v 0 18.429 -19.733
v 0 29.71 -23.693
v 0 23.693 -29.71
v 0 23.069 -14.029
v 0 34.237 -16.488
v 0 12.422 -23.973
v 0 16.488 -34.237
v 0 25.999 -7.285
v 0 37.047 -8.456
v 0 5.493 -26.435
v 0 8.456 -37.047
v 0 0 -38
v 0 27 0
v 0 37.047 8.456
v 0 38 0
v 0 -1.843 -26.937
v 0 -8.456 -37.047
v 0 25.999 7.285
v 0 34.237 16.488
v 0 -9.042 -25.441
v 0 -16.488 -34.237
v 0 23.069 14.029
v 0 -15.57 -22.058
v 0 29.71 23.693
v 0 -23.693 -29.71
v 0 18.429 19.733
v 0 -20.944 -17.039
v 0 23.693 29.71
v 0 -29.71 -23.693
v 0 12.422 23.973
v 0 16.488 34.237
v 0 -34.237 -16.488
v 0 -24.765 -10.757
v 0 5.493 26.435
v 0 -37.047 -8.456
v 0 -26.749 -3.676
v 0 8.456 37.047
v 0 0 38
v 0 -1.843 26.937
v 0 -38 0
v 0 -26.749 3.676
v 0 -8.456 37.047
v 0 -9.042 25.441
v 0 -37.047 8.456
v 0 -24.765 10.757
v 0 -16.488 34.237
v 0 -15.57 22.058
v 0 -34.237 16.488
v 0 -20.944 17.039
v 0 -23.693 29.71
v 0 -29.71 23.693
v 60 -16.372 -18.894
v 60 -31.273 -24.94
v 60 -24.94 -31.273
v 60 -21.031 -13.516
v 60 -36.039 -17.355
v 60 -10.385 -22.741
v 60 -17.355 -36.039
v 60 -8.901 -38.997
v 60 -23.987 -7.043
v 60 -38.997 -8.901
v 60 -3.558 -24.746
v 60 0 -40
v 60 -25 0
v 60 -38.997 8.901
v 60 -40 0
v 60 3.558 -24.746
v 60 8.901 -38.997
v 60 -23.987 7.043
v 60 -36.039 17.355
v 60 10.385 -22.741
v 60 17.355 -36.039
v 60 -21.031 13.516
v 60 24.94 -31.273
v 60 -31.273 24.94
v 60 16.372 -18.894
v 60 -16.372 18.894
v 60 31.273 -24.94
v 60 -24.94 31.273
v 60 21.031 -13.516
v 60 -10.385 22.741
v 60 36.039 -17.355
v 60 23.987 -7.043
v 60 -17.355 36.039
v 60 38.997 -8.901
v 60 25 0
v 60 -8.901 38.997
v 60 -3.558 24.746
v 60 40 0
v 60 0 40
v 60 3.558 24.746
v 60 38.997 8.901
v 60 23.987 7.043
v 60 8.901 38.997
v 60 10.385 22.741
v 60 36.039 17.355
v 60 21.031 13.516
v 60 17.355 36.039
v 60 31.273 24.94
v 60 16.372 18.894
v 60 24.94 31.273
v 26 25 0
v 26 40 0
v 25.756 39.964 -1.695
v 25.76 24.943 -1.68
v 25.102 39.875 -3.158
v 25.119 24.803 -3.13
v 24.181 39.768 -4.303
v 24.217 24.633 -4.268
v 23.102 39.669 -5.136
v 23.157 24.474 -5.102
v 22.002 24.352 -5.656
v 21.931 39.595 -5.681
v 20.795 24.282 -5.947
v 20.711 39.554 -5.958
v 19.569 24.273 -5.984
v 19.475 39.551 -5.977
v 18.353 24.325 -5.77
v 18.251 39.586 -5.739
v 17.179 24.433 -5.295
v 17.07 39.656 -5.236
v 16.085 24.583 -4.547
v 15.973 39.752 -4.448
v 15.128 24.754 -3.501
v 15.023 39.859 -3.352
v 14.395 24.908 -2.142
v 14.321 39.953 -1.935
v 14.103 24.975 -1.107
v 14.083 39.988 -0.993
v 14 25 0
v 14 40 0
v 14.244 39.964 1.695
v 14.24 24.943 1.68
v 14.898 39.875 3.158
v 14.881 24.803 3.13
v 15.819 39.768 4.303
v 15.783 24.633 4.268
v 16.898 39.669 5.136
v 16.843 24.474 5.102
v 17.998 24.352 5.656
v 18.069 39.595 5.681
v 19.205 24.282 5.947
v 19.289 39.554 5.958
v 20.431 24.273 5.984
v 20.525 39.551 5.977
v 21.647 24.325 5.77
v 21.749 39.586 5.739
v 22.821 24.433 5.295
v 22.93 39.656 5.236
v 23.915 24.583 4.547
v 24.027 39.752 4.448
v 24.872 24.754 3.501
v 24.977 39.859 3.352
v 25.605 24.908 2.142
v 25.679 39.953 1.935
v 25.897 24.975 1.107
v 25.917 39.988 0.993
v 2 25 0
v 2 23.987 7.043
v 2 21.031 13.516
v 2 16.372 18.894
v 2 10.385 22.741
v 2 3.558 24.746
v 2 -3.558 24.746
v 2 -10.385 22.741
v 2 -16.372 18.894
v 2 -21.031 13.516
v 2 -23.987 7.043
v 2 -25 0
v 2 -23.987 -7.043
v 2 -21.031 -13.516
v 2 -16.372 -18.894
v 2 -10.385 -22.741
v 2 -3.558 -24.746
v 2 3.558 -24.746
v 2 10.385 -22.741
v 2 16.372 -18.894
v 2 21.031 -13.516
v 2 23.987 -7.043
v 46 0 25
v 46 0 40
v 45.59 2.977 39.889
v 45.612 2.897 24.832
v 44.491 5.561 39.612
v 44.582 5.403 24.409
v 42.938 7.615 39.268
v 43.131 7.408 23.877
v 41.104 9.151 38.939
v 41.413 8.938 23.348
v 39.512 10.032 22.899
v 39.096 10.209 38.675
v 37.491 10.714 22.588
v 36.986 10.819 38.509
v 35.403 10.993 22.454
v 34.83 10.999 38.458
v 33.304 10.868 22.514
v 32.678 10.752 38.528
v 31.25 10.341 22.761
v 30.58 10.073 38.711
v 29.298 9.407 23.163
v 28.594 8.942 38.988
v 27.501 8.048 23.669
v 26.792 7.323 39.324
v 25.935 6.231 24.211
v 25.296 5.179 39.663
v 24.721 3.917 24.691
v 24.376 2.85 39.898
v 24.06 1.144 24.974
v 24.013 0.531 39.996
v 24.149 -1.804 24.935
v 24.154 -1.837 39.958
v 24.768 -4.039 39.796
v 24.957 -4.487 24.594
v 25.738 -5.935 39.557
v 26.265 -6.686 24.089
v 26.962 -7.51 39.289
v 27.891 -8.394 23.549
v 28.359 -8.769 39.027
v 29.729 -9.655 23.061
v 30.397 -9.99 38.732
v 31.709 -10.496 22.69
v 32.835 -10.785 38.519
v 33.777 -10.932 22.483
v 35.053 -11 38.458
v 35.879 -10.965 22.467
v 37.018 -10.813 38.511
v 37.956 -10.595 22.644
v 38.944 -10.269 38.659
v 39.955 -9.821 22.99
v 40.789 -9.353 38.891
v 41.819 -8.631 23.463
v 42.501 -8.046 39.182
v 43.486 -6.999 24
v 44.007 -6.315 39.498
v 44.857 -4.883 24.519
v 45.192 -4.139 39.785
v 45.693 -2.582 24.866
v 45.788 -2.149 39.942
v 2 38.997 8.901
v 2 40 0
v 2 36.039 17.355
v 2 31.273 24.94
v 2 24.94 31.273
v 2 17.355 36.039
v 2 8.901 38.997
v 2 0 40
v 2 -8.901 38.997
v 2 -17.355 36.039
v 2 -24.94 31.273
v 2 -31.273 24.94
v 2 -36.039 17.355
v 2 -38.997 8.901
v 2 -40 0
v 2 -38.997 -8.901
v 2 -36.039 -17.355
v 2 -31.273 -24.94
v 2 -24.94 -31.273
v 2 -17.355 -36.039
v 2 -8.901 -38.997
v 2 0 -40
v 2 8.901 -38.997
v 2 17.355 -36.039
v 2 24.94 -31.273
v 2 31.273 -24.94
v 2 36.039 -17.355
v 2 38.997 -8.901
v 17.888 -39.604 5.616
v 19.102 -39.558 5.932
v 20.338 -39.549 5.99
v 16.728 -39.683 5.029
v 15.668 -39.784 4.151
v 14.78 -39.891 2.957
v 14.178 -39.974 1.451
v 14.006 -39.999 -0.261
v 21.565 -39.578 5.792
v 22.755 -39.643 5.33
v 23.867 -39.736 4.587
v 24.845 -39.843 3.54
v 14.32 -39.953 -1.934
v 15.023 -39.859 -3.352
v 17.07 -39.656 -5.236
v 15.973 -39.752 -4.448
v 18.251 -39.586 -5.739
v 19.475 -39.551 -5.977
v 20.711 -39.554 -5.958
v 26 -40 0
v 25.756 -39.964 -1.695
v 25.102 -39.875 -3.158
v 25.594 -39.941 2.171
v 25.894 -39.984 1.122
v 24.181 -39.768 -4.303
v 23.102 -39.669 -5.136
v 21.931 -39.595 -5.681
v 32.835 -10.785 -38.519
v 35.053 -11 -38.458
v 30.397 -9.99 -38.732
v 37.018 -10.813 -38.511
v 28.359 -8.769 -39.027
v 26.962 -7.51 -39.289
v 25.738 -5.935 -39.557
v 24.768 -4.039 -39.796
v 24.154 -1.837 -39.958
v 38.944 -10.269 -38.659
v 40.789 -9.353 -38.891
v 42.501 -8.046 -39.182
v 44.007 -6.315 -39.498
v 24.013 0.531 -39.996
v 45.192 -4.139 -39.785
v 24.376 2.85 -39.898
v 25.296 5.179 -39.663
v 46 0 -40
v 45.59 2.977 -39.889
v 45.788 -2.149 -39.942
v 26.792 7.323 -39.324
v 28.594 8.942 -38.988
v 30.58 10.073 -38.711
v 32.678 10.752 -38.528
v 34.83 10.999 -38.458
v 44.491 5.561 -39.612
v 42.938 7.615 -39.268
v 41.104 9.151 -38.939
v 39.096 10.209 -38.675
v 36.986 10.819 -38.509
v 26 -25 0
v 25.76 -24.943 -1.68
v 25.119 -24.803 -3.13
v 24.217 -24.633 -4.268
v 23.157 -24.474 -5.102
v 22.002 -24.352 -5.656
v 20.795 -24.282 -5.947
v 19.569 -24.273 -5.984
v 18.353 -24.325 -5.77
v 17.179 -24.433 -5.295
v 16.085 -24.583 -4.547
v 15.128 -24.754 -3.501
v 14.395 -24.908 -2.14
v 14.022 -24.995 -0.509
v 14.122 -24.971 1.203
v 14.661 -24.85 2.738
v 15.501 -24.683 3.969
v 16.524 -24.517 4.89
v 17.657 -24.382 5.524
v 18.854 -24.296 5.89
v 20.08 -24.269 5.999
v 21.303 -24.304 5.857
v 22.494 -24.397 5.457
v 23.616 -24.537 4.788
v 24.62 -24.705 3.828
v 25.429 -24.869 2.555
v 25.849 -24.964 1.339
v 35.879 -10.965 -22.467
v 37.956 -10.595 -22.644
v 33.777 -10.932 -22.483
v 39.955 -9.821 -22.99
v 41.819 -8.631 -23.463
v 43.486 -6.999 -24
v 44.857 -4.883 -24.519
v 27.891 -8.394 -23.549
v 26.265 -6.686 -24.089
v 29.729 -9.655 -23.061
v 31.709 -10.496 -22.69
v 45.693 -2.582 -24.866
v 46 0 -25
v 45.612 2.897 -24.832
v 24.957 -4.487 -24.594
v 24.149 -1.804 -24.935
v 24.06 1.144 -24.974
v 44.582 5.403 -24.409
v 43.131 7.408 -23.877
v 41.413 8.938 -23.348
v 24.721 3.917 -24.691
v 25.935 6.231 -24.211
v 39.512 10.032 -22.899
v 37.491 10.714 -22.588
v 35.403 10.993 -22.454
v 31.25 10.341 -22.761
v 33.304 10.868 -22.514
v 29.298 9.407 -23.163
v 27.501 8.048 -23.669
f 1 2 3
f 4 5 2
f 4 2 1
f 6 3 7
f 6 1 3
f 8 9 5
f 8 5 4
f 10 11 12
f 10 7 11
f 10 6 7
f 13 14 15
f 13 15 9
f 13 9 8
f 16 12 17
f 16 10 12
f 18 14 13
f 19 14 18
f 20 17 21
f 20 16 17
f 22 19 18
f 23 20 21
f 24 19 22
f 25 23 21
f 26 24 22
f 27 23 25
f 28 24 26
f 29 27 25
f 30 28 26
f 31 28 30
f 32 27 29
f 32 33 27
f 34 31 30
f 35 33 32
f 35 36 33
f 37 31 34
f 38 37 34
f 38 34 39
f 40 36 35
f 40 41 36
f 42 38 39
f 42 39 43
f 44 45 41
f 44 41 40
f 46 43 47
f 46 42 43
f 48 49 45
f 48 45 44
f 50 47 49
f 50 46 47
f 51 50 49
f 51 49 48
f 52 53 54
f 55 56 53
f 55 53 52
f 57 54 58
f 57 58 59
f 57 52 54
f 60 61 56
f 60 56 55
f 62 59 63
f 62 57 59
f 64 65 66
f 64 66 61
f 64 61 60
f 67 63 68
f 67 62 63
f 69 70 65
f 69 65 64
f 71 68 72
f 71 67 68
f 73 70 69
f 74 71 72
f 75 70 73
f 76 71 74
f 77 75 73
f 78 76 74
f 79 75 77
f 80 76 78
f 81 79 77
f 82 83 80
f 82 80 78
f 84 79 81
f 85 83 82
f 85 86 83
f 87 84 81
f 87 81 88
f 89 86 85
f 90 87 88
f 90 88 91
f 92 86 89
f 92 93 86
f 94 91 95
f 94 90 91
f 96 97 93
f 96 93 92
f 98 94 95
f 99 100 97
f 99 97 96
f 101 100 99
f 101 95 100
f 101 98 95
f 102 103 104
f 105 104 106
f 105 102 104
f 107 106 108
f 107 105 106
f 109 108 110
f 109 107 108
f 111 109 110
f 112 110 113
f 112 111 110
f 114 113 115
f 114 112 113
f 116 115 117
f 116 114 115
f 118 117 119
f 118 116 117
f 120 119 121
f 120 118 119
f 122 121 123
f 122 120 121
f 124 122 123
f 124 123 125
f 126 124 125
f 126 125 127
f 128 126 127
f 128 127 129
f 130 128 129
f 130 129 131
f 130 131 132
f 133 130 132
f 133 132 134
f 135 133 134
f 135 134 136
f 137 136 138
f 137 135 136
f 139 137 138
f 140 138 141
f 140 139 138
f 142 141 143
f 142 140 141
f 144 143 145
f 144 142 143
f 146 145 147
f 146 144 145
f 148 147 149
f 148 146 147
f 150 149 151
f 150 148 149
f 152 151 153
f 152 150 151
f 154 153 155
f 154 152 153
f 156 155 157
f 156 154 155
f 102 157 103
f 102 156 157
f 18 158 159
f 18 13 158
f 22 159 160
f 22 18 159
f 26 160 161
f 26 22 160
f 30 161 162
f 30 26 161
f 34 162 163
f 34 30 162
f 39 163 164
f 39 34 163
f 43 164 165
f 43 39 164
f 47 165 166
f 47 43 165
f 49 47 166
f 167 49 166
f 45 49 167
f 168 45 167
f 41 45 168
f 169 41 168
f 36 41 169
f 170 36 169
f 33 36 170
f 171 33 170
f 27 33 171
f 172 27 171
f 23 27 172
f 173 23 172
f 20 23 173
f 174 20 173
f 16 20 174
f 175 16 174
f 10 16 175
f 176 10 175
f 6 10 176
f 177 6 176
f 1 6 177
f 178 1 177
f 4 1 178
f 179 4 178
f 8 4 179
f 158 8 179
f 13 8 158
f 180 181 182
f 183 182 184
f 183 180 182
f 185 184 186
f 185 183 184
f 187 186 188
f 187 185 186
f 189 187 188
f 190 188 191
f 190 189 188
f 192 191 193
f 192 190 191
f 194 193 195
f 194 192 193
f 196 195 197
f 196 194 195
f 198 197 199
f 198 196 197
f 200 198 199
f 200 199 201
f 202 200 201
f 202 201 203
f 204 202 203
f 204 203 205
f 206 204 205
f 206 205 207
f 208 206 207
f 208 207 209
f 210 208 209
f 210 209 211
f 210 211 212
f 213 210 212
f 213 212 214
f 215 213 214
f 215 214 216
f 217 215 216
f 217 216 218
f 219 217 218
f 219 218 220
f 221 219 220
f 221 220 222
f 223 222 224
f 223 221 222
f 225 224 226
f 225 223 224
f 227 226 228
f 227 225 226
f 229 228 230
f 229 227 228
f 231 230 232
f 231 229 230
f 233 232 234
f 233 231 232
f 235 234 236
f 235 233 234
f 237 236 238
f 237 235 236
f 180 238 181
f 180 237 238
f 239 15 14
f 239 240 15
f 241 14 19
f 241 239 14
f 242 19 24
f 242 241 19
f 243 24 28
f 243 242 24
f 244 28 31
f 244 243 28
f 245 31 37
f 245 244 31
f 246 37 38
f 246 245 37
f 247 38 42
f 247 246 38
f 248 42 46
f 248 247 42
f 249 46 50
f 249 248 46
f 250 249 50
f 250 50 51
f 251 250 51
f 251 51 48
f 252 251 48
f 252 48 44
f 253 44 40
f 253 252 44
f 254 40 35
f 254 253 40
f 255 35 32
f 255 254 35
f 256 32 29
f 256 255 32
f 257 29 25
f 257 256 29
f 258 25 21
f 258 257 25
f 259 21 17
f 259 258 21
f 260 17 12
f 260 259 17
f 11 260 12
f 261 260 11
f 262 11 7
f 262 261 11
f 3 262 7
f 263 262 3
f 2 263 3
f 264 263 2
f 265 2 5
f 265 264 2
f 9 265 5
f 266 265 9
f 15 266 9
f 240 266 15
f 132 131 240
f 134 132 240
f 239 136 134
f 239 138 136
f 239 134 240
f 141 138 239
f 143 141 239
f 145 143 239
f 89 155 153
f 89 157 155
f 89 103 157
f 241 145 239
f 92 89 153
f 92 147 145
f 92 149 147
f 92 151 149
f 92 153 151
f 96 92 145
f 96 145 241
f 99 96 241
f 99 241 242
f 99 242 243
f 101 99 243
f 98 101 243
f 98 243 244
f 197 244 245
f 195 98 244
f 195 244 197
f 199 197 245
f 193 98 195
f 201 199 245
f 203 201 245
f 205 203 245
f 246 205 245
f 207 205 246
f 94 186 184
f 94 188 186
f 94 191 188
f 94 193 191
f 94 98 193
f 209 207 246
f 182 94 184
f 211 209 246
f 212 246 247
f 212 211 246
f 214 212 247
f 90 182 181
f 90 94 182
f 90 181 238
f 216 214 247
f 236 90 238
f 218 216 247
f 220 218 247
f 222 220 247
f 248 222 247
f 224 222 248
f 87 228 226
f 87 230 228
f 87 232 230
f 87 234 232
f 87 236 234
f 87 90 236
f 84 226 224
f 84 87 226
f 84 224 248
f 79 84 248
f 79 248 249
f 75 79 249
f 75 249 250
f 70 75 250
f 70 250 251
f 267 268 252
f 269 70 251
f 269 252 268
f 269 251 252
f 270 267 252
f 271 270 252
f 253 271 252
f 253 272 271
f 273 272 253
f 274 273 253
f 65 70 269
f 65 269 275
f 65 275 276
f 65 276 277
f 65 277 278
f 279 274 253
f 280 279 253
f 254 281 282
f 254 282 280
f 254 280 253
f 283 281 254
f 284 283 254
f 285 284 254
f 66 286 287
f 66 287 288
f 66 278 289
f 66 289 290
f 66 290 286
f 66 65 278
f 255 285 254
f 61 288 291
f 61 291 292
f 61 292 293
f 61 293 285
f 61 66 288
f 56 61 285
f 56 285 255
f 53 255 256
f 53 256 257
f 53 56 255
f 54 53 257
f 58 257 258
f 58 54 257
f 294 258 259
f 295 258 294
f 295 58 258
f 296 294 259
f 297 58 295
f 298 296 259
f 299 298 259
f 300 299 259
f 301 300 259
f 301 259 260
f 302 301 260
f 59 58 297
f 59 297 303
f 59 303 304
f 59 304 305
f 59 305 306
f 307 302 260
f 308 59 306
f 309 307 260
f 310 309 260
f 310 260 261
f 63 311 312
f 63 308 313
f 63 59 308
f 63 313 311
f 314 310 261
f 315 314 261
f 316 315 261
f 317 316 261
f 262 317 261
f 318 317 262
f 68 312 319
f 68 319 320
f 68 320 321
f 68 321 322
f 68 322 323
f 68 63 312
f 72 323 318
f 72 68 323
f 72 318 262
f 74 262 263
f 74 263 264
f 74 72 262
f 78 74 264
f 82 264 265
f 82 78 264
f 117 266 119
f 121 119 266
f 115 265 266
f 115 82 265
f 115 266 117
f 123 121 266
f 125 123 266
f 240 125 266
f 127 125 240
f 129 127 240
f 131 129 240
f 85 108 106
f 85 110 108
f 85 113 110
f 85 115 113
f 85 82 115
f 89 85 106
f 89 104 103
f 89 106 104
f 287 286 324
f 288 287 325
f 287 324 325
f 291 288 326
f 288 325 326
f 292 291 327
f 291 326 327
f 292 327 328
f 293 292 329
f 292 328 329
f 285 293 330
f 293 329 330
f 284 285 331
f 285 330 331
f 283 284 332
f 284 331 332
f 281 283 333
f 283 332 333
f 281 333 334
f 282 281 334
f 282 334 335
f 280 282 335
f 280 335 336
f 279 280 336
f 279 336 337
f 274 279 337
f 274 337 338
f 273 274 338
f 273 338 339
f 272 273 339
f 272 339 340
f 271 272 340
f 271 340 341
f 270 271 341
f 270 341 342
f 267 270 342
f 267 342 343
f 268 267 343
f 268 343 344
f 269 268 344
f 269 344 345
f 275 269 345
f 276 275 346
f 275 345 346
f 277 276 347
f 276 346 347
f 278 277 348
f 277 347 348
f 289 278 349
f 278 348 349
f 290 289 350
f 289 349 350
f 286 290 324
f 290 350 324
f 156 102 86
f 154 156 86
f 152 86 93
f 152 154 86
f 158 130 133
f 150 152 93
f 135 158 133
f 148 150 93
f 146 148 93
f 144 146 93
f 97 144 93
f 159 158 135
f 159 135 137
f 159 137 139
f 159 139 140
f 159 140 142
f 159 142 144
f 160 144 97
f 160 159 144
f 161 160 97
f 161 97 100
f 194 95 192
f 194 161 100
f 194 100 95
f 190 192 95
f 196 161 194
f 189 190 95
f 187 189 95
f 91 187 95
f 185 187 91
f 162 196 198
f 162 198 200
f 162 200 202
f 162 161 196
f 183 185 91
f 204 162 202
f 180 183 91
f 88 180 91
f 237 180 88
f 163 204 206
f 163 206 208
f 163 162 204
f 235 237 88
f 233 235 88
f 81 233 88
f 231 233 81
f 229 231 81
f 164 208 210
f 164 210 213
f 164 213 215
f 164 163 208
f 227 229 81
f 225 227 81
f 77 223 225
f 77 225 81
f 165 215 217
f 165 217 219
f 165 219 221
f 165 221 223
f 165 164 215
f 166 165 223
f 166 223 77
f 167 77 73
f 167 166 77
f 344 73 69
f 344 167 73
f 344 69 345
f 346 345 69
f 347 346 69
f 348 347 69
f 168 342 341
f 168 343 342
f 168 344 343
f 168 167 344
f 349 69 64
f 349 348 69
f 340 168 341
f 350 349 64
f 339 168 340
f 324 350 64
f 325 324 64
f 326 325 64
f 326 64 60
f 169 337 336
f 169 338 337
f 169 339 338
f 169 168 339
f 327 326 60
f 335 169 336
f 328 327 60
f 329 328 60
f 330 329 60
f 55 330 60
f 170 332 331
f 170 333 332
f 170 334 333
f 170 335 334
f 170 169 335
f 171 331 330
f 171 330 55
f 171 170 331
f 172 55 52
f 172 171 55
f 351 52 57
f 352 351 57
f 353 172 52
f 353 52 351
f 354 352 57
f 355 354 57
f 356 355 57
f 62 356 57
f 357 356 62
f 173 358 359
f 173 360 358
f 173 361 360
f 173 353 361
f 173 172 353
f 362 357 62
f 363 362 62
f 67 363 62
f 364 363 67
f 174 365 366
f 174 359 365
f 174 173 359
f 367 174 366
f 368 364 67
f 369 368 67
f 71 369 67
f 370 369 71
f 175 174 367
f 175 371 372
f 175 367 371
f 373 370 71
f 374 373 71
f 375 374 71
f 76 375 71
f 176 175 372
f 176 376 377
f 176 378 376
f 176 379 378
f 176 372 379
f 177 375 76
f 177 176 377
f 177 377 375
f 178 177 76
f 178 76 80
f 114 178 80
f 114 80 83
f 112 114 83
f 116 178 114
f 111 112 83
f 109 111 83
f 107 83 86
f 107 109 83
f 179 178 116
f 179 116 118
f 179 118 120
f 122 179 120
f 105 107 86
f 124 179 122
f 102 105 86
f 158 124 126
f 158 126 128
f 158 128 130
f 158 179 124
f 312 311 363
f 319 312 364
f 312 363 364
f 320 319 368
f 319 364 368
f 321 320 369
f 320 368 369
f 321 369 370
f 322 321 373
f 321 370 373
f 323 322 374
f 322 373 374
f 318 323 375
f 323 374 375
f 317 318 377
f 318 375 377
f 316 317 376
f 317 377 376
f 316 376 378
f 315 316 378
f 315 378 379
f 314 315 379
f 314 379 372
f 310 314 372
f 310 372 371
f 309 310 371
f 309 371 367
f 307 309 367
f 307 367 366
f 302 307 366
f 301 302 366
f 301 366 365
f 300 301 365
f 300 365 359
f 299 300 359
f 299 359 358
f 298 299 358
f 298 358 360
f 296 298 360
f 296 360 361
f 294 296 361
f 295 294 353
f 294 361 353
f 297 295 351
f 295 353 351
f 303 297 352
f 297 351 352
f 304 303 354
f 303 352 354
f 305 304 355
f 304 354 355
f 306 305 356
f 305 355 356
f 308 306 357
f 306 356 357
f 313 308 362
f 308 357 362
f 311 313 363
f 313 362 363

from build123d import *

# Parameters (mm, degrees)
SKETCH2_R               = 6
CUT_EXTRUDE1_DEPTH      = 41
CUT_EXTRUDE1_DEPTH_BACK = 41
SKETCH3_R               = 11
CUT_EXTRUDE2_DEPTH      = 41.0000001
CUT_EXTRUDE2_DEPTH_BACK = 41.0000001


with BuildPart() as part:
    # Sketch1 → Revolve1 (revolve)
    with BuildSketch(Plane.XY):
        Polygon((2, 40), (60, 40), (60, 25), (2, 25), (0, 27), (0, 38), align=None)
    revolve(axis=Axis((0, 0, 0), (1, 0, 0)))

    # Sketch2 → Cut-Extrude1 (cut, two sides)
    with BuildSketch(Plane(origin=(0, 0, 0), x_dir=(1, 0, 0), z_dir=(0, 1, 0))) as cut_extrude1_sk:
        with Locations((20, 0)):
            Circle(SKETCH2_R)
    extrude(amount=CUT_EXTRUDE1_DEPTH, mode=Mode.SUBTRACT)
    extrude(cut_extrude1_sk.sketch, amount=-CUT_EXTRUDE1_DEPTH_BACK, mode=Mode.SUBTRACT)

    # Sketch3 → Cut-Extrude2 (cut, two sides)
    with BuildSketch(Plane.XY) as cut_extrude2_sk:
        with Locations((35, 0)):
            Circle(SKETCH3_R)
    extrude(amount=CUT_EXTRUDE2_DEPTH, mode=Mode.SUBTRACT)
    extrude(cut_extrude2_sk.sketch, amount=-CUT_EXTRUDE2_DEPTH_BACK, mode=Mode.SUBTRACT)


solid = part.part
